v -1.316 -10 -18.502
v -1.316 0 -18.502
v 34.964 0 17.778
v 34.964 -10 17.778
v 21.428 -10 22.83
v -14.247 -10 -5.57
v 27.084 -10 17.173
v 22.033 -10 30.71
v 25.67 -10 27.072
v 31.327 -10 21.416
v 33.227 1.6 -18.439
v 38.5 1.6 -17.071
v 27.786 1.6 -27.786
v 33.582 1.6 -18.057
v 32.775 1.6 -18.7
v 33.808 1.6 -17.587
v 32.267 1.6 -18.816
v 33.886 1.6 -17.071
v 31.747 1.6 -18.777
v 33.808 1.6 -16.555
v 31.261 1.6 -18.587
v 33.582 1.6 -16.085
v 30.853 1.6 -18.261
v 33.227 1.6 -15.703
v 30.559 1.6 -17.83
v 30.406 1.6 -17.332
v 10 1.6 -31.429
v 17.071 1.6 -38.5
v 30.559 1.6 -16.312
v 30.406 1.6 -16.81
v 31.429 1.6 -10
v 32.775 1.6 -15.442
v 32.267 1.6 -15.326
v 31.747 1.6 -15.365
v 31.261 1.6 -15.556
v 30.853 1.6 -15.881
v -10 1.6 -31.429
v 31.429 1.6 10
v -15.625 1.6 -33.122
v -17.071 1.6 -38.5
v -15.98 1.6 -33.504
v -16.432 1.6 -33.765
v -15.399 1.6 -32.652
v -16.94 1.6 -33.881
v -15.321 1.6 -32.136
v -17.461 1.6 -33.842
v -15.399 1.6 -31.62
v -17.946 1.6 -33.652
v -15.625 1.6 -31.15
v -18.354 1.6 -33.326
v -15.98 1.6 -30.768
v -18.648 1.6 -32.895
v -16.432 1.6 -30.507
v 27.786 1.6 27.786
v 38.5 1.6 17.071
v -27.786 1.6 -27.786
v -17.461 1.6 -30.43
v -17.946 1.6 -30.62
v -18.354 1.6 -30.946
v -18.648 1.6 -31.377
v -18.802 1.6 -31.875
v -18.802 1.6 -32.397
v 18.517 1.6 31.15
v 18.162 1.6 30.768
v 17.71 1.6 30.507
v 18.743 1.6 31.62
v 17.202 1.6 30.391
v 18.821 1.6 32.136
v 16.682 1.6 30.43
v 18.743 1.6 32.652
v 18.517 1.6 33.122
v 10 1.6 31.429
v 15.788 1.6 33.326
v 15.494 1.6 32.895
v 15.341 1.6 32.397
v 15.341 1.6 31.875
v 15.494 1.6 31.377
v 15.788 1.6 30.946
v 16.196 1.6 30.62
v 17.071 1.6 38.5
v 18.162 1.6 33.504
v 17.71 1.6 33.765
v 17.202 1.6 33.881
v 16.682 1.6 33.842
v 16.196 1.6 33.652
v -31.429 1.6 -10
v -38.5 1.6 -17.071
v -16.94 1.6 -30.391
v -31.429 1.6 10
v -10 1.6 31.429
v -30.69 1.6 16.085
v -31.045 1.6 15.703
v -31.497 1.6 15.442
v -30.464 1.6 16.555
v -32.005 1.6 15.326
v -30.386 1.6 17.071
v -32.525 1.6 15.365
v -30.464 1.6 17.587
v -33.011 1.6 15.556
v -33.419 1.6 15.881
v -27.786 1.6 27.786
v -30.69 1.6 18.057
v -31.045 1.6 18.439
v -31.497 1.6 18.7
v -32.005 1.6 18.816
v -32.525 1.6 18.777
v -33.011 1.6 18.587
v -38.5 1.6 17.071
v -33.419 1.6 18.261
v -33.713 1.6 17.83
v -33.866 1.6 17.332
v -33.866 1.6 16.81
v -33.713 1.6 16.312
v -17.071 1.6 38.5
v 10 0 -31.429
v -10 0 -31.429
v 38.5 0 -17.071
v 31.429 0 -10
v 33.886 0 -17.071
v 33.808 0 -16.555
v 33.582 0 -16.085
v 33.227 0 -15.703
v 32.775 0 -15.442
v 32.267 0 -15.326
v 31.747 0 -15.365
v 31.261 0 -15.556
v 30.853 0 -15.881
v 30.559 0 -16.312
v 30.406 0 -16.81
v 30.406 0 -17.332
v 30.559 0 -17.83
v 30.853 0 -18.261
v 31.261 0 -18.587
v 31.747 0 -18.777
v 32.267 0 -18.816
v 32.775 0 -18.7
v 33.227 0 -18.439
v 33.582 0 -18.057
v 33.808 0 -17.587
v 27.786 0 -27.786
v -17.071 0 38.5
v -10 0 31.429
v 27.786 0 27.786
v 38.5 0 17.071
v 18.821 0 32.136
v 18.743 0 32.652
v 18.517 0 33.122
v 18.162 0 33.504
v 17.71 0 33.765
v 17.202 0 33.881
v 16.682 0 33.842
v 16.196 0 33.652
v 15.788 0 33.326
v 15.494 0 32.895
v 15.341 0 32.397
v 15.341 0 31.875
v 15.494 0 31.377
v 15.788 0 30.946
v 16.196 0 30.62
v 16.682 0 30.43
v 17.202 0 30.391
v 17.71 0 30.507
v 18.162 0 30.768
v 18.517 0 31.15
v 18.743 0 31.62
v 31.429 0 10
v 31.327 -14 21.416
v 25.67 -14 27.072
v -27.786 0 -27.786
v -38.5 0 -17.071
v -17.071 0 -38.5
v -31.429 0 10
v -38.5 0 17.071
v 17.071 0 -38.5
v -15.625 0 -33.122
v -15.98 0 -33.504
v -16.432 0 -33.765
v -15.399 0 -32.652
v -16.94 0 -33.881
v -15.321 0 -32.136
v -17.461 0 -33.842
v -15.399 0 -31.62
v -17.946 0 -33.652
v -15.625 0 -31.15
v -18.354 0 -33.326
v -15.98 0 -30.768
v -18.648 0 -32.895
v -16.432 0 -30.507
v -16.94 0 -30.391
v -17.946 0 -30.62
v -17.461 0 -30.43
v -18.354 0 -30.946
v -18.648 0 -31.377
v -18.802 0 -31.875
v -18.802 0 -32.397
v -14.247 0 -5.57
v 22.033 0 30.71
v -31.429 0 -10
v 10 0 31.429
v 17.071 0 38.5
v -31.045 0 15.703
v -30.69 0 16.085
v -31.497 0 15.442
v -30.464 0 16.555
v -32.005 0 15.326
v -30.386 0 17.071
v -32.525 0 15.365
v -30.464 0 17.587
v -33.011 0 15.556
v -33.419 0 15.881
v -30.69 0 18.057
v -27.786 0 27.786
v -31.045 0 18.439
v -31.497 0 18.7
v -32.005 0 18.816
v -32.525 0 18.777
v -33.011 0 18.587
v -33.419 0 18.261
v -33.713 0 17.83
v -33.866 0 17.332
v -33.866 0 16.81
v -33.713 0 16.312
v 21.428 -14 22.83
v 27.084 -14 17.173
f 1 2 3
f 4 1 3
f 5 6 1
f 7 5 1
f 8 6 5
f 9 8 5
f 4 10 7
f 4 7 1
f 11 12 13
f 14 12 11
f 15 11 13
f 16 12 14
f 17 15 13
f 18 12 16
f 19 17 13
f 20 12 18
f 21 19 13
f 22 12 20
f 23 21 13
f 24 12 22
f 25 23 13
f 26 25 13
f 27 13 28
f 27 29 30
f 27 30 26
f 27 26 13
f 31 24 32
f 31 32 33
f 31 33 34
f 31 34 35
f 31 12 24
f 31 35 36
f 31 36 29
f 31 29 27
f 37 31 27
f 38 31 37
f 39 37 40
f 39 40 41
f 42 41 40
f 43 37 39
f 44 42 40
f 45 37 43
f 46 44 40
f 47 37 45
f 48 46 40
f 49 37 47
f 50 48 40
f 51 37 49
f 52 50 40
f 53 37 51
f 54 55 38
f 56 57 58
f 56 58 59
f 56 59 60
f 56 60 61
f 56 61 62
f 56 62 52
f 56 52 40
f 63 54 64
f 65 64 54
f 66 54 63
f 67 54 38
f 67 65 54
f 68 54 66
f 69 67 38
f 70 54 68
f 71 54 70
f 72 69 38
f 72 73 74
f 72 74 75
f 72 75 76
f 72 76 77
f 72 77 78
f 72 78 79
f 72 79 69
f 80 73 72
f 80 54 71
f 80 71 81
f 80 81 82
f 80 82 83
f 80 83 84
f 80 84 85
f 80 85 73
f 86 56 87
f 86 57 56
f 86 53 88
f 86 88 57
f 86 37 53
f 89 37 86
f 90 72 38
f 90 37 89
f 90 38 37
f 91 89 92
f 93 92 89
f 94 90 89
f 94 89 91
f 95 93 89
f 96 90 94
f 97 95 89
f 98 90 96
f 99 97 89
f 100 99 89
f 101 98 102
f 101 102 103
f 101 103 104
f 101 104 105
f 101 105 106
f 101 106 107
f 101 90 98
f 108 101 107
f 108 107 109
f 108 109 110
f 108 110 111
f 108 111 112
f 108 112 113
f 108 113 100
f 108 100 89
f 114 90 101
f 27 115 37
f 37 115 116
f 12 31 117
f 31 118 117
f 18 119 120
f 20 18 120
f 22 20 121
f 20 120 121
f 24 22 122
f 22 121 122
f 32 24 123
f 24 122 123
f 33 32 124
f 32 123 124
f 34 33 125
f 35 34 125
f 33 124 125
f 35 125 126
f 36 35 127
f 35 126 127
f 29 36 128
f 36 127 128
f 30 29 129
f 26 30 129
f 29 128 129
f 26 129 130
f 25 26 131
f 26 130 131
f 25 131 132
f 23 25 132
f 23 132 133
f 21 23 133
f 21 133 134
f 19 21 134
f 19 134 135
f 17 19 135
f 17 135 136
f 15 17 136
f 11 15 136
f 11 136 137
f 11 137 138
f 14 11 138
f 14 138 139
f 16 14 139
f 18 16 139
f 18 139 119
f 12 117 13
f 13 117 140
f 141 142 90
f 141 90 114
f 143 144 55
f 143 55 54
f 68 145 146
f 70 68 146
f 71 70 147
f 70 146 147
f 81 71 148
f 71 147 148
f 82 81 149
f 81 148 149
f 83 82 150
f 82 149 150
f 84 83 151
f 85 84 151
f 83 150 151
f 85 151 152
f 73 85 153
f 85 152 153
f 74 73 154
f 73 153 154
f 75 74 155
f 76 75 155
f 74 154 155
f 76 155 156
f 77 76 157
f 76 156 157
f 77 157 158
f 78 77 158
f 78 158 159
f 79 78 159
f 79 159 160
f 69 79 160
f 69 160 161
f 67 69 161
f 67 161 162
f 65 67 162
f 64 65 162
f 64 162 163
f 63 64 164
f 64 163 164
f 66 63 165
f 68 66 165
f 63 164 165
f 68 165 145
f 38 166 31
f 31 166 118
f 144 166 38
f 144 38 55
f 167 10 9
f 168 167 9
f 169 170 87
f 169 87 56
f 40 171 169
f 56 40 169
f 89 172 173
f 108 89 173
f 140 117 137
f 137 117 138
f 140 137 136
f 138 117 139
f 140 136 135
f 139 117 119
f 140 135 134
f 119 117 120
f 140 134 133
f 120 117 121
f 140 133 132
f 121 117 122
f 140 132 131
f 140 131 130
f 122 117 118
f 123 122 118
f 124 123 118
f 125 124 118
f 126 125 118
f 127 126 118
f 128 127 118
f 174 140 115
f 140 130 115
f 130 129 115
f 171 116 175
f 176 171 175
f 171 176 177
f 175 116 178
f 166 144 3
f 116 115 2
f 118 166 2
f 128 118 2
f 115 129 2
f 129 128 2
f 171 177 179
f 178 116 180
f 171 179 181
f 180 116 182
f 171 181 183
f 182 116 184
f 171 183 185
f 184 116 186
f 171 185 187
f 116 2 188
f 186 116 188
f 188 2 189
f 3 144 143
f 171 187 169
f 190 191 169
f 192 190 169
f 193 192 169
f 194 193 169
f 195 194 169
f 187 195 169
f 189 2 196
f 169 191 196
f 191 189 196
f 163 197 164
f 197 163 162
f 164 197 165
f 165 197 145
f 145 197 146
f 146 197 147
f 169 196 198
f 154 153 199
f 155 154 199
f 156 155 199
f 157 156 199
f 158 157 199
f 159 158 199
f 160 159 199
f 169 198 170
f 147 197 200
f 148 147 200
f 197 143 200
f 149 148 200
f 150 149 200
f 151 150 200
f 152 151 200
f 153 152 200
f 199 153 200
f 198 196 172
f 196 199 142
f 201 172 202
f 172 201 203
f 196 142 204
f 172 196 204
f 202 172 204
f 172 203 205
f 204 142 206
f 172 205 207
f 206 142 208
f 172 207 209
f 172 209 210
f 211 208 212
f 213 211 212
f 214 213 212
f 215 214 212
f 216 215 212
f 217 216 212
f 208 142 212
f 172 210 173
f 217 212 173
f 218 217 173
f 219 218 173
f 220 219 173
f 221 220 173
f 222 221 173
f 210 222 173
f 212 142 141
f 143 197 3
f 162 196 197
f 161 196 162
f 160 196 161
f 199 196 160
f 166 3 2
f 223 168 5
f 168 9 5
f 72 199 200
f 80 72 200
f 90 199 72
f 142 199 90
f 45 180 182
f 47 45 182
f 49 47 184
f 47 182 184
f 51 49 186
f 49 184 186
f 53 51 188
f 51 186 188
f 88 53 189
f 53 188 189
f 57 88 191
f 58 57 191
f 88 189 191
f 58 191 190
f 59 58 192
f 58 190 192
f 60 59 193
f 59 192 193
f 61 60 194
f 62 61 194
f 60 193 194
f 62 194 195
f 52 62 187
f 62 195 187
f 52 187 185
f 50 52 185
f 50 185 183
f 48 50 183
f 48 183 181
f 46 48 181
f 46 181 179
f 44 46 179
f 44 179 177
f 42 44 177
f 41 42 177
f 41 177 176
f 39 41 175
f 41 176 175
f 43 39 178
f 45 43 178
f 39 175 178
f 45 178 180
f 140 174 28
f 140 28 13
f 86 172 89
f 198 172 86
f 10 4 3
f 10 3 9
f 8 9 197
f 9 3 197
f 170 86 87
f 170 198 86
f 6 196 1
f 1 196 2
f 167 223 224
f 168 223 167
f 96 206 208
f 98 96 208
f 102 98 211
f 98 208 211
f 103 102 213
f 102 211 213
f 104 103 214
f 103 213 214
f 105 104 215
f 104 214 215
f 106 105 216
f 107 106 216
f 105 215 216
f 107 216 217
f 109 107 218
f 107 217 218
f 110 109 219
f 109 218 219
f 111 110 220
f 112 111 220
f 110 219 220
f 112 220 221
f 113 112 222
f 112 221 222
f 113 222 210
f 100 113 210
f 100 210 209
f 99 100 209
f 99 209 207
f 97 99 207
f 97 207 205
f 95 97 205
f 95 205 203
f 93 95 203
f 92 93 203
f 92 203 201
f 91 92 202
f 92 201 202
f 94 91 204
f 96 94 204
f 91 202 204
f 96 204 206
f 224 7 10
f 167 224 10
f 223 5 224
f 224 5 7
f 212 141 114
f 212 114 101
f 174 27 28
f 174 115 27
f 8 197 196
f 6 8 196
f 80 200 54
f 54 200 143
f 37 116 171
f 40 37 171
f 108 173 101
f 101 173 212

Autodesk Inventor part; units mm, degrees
ref_plane "YZ Plane" through (0, 0, 0) normal (1, 0, 0) x (0, 1, 0)
ref_plane "XZ Plane" through (0, 0, 0) normal (0, 1, 0) x (-1, 0, 0)
ref_plane "XY Plane" through (0, 0, 0) normal (0, 0, 1) x (1, 0, 0)
sketch "Esquisse1" plane through (0, 0, 0) normal (0, 1, 0) x (-1, 0, 0)
  line L0 (0, 0) -> (40.8419, 40.8419) construction
  line L1 (0, 0) -> (43.2459, 0) construction
  line L2 (0, 0) -> (0, 37.214) construction
  line L3 (31.4289, 0) -> (31.4289, 10)
  line L4 (31.4289, 10) -> (38.5, 17.0711)
  line L5 (38.5, 17.0711) -> (27.7855, 27.7855)
  line L6 (0, 31.4289) -> (10, 31.4289)
  line L7 (10, 31.4289) -> (17.0711, 38.5)
  line L8 (17.0711, 38.5) -> (27.7855, 27.7855)
  line L9 (31.4289, 0) -> (31.4289, -10)
  line L10 (31.4289, -10) -> (38.5, -17.0711)
  line L11 (38.5, -17.0711) -> (27.7855, -27.7855)
  line L12 (0, -31.4289) -> (10, -31.4289)
  line L13 (10, -31.4289) -> (17.0711, -38.5)
  line L14 (17.0711, -38.5) -> (27.7855, -27.7855)
  line L15 (0, 0) -> (-40.8419, 40.8419) construction
  line L16 (0, 0) -> (-43.2459, 0) construction
  line L17 (-31.4289, 0) -> (-31.4289, 10)
  line L18 (-31.4289, 10) -> (-38.5, 17.0711)
  line L19 (-38.5, 17.0711) -> (-27.7855, 27.7855)
  line L20 (0, 31.4289) -> (-10, 31.4289)
  line L21 (-10, 31.4289) -> (-17.0711, 38.5)
  line L22 (-17.0711, 38.5) -> (-27.7855, 27.7855)
  line L23 (-38.5, -17.0711) -> (-27.7855, -27.7855)
  line L24 (-31.4289, -10) -> (-38.5, -17.0711)
  line L25 (-31.4289, 0) -> (-31.4289, -10)
  line L26 (-17.0711, -38.5) -> (-27.7855, -27.7855)
  line L27 (-10, -31.4289) -> (-17.0711, -38.5)
  line L28 (0, -31.4289) -> (-10, -31.4289)
  dimension "d4" = 45
  dimension "d5" = 10
  dimension "d6" = 10
  dimension "d7" = 38.5
  dimension "d10" = 77
extrude "Extrusion1" add sketch "Esquisse1" along normal blind 1.6
sketch "Esquisse3" plane through (0, 0, 0) normal (0, -1, 0) x (1, 0, 0)
  line L0 (-31.4289, -10) -> (-31.4289, 10) construction
  line L1 (-38.5, -17.0711) -> (-31.4289, -10) construction
  line L2 (-17.0711, -38.5) -> (-38.5, -17.0711) construction
  line L3 (-10, -31.4289) -> (-17.0711, -38.5) construction
  line L4 (10, -31.4289) -> (-10, -31.4289) construction
  line L5 (17.0711, -38.5) -> (10, -31.4289) construction
  line L6 (38.5, -17.0711) -> (17.0711, -38.5) construction
  line L7 (31.4289, -10) -> (38.5, -17.0711) construction
  line L8 (31.4289, 10) -> (31.4289, -10) construction
  line L9 (38.5, 17.0711) -> (31.4289, 10) construction
  line L10 (17.0711, 38.5) -> (38.5, 17.0711) construction
  line L11 (10, 31.4289) -> (17.0711, 38.5) construction
  line L12 (-10, 31.4289) -> (10, 31.4289) construction
  line L13 (-17.0711, 38.5) -> (-10, 31.4289) construction
  line L14 (-38.5, 17.0711) -> (-17.0711, 38.5) construction
  line L15 (-31.4289, 10) -> (-38.5, 17.0711) construction
  circle A0 centre (-32.136, 17.0711) radius 1.75
  circle A1 centre (-17.0711, -32.136) radius 1.75
  circle A2 centre (32.136, -17.0711) radius 1.75
  circle A3 centre (17.0711, 32.136) radius 1.75
  point P0 (0, 0)
  point P1 (16, 32)
  point P2 (0, 0)
  point P3 (0, 0)
  point P4 (0, 0)
  dimension "d36" = 4.5
  dimension "d37" = 4.5
  dimension "d38" = 3.5
  dimension "d41" = 360
extrude "Extrusion2" cut sketch "Esquisse3" against normal through all
sketch "Esquisse4" plane through (0, 0, 0) normal (0, -1, 0) x (1, 0, 0)
  point P0 (0, 0)
sketch "Esquisse5" plane through (0, 0, 0) normal (0, -1, 0) x (1, 0, 0)
  line L0 (-31.4289, -10) -> (-31.4289, 10) construction
  line L1 (-38.5, -17.0711) -> (-31.4289, -10) construction
  line L2 (-17.0711, -38.5) -> (-38.5, -17.0711) construction
  line L3 (-10, -31.4289) -> (-17.0711, -38.5) construction
  line L4 (10, -31.4289) -> (-10, -31.4289) construction
  line L5 (17.0711, -38.5) -> (10, -31.4289) construction
  line L6 (38.5, -17.0711) -> (17.0711, -38.5) construction
  line L7 (31.4289, -10) -> (38.5, -17.0711) construction
  line L8 (31.4289, 10) -> (31.4289, -10) construction
  line L9 (38.5, 17.0711) -> (31.4289, 10) construction
  line L10 (17.0711, 38.5) -> (38.5, 17.0711) construction
  line L11 (10, 31.4289) -> (17.0711, 38.5) construction
  line L12 (-10, 31.4289) -> (10, 31.4289) construction
  line L13 (-17.0711, 38.5) -> (-10, 31.4289) construction
  line L14 (-38.5, 17.0711) -> (-17.0711, 38.5) construction
  line L15 (-31.4289, 10) -> (-38.5, 17.0711) construction
  line L16 (0, 0) -> (-31.4289, 0) construction
  line L17 (0, 0) -> (0, -31.4289) construction
  dimension "d29" = 38.5
  dimension "d30" = 17.0711
  dimension "d31" = 31.4289
  dimension "d32" = 10
  dimension "d33" = 17.0711
  dimension "d34" = 38.5
  dimension "d35" = 10
sketch "Esquisse6" plane through (0, 0, 0) normal (0, -1, 0) x (1, 0, 0)
  line L0 (22.0329, 30.7097) -> (-14.2473, -5.5705)
  line L1 (-14.2473, -5.5705) -> (-1.3158, -18.5021)
  line L2 (-1.3158, -18.5021) -> (34.9645, 17.7782)
  line L3 (34.9645, 17.7782) -> (22.0329, 30.7097)
  line L4 (17.0711, 38.5) -> (38.5, 17.0711) projected
  line L5 (38.5, 17.0711) -> (31.4289, 10) projected
  point P0 (0, 0)
  dimension "d43" = 2
  dimension "d44" = 51.308
  dimension "d45" = 18.288
  dimension "d46" = 3
extrude "Extrusion3" add sketch "Esquisse6" along normal blind 10
sketch "Esquisse7" plane through (0, -10, 0) normal (0, -1, 0) x (1, 0, 0)
  line L0 (21.4276, 22.8297) -> (27.0845, 17.1729)
  line L1 (27.0845, 17.1729) -> (31.3271, 21.4155)
  line L2 (31.3271, 21.4155) -> (25.6703, 27.0724)
  line L3 (25.6703, 27.0724) -> (21.4276, 22.8297)
  line L4 (34.9645, 17.7782) -> (22.0329, 30.7097) projected
  point P0 (0, 0)
  point P1 (28.4987, 24.244)
  dimension "d49" = 8
  dimension "d50" = 6
extrude "Extrusion4" add sketch "Esquisse7" along normal blind 4
properties part number "x_board"
